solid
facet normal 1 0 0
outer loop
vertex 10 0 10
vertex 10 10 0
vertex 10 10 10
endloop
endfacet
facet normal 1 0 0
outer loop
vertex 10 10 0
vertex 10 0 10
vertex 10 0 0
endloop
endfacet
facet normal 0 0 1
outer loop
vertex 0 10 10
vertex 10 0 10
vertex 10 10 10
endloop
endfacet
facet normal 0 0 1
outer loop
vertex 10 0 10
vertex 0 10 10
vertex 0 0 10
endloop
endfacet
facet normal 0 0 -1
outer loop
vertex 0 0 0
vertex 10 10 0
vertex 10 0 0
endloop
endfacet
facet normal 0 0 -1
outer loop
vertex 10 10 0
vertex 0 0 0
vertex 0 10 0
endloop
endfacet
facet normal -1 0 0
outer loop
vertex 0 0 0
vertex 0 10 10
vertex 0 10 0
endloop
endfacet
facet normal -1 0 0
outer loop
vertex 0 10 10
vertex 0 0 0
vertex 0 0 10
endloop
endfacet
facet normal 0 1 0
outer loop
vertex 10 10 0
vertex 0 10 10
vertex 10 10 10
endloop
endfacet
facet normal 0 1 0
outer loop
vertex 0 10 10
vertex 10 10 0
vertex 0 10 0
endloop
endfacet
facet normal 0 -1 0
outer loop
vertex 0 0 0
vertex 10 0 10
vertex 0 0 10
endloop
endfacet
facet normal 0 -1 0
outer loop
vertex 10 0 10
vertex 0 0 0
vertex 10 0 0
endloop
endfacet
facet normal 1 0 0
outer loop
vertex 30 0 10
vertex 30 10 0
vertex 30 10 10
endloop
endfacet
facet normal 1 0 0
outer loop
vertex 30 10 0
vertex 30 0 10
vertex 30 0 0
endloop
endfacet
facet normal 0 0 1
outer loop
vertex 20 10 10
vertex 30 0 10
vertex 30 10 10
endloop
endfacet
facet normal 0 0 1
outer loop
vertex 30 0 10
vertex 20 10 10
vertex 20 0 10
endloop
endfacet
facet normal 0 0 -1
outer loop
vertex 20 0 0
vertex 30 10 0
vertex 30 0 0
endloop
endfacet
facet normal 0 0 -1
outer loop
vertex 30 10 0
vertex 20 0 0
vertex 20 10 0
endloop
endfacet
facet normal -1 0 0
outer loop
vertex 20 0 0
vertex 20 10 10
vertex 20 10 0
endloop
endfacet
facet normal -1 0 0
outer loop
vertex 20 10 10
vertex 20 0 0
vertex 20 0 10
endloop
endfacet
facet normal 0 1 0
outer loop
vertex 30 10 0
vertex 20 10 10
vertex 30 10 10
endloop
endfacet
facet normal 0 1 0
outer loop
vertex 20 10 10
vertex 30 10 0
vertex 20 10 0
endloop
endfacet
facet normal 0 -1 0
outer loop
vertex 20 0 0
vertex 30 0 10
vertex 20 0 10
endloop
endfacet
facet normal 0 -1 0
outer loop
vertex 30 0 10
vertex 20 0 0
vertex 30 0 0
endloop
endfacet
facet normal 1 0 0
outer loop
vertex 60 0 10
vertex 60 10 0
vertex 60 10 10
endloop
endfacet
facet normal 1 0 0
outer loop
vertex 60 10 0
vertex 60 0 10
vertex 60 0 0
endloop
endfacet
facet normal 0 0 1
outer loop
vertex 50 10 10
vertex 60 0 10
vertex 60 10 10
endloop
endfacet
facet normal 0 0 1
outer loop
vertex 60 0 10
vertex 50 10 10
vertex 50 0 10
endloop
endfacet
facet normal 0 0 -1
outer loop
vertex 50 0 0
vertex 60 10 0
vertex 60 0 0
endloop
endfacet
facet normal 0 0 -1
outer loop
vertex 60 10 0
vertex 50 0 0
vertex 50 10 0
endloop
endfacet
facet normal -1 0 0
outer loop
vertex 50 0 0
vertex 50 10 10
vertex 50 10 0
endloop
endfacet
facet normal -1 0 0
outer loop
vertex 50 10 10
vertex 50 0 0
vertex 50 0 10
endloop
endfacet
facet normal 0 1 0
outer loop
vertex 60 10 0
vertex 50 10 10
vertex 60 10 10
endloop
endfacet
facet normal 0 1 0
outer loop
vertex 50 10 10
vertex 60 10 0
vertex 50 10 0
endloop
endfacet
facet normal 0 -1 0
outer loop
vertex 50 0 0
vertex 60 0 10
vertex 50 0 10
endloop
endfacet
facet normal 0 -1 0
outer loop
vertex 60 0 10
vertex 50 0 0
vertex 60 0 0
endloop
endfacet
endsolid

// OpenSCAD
cube([10,10,10]);
translate([20,0,0])
cube([10,10,10]);
translate([50,0,0])
cube([10,10,10]);
 
